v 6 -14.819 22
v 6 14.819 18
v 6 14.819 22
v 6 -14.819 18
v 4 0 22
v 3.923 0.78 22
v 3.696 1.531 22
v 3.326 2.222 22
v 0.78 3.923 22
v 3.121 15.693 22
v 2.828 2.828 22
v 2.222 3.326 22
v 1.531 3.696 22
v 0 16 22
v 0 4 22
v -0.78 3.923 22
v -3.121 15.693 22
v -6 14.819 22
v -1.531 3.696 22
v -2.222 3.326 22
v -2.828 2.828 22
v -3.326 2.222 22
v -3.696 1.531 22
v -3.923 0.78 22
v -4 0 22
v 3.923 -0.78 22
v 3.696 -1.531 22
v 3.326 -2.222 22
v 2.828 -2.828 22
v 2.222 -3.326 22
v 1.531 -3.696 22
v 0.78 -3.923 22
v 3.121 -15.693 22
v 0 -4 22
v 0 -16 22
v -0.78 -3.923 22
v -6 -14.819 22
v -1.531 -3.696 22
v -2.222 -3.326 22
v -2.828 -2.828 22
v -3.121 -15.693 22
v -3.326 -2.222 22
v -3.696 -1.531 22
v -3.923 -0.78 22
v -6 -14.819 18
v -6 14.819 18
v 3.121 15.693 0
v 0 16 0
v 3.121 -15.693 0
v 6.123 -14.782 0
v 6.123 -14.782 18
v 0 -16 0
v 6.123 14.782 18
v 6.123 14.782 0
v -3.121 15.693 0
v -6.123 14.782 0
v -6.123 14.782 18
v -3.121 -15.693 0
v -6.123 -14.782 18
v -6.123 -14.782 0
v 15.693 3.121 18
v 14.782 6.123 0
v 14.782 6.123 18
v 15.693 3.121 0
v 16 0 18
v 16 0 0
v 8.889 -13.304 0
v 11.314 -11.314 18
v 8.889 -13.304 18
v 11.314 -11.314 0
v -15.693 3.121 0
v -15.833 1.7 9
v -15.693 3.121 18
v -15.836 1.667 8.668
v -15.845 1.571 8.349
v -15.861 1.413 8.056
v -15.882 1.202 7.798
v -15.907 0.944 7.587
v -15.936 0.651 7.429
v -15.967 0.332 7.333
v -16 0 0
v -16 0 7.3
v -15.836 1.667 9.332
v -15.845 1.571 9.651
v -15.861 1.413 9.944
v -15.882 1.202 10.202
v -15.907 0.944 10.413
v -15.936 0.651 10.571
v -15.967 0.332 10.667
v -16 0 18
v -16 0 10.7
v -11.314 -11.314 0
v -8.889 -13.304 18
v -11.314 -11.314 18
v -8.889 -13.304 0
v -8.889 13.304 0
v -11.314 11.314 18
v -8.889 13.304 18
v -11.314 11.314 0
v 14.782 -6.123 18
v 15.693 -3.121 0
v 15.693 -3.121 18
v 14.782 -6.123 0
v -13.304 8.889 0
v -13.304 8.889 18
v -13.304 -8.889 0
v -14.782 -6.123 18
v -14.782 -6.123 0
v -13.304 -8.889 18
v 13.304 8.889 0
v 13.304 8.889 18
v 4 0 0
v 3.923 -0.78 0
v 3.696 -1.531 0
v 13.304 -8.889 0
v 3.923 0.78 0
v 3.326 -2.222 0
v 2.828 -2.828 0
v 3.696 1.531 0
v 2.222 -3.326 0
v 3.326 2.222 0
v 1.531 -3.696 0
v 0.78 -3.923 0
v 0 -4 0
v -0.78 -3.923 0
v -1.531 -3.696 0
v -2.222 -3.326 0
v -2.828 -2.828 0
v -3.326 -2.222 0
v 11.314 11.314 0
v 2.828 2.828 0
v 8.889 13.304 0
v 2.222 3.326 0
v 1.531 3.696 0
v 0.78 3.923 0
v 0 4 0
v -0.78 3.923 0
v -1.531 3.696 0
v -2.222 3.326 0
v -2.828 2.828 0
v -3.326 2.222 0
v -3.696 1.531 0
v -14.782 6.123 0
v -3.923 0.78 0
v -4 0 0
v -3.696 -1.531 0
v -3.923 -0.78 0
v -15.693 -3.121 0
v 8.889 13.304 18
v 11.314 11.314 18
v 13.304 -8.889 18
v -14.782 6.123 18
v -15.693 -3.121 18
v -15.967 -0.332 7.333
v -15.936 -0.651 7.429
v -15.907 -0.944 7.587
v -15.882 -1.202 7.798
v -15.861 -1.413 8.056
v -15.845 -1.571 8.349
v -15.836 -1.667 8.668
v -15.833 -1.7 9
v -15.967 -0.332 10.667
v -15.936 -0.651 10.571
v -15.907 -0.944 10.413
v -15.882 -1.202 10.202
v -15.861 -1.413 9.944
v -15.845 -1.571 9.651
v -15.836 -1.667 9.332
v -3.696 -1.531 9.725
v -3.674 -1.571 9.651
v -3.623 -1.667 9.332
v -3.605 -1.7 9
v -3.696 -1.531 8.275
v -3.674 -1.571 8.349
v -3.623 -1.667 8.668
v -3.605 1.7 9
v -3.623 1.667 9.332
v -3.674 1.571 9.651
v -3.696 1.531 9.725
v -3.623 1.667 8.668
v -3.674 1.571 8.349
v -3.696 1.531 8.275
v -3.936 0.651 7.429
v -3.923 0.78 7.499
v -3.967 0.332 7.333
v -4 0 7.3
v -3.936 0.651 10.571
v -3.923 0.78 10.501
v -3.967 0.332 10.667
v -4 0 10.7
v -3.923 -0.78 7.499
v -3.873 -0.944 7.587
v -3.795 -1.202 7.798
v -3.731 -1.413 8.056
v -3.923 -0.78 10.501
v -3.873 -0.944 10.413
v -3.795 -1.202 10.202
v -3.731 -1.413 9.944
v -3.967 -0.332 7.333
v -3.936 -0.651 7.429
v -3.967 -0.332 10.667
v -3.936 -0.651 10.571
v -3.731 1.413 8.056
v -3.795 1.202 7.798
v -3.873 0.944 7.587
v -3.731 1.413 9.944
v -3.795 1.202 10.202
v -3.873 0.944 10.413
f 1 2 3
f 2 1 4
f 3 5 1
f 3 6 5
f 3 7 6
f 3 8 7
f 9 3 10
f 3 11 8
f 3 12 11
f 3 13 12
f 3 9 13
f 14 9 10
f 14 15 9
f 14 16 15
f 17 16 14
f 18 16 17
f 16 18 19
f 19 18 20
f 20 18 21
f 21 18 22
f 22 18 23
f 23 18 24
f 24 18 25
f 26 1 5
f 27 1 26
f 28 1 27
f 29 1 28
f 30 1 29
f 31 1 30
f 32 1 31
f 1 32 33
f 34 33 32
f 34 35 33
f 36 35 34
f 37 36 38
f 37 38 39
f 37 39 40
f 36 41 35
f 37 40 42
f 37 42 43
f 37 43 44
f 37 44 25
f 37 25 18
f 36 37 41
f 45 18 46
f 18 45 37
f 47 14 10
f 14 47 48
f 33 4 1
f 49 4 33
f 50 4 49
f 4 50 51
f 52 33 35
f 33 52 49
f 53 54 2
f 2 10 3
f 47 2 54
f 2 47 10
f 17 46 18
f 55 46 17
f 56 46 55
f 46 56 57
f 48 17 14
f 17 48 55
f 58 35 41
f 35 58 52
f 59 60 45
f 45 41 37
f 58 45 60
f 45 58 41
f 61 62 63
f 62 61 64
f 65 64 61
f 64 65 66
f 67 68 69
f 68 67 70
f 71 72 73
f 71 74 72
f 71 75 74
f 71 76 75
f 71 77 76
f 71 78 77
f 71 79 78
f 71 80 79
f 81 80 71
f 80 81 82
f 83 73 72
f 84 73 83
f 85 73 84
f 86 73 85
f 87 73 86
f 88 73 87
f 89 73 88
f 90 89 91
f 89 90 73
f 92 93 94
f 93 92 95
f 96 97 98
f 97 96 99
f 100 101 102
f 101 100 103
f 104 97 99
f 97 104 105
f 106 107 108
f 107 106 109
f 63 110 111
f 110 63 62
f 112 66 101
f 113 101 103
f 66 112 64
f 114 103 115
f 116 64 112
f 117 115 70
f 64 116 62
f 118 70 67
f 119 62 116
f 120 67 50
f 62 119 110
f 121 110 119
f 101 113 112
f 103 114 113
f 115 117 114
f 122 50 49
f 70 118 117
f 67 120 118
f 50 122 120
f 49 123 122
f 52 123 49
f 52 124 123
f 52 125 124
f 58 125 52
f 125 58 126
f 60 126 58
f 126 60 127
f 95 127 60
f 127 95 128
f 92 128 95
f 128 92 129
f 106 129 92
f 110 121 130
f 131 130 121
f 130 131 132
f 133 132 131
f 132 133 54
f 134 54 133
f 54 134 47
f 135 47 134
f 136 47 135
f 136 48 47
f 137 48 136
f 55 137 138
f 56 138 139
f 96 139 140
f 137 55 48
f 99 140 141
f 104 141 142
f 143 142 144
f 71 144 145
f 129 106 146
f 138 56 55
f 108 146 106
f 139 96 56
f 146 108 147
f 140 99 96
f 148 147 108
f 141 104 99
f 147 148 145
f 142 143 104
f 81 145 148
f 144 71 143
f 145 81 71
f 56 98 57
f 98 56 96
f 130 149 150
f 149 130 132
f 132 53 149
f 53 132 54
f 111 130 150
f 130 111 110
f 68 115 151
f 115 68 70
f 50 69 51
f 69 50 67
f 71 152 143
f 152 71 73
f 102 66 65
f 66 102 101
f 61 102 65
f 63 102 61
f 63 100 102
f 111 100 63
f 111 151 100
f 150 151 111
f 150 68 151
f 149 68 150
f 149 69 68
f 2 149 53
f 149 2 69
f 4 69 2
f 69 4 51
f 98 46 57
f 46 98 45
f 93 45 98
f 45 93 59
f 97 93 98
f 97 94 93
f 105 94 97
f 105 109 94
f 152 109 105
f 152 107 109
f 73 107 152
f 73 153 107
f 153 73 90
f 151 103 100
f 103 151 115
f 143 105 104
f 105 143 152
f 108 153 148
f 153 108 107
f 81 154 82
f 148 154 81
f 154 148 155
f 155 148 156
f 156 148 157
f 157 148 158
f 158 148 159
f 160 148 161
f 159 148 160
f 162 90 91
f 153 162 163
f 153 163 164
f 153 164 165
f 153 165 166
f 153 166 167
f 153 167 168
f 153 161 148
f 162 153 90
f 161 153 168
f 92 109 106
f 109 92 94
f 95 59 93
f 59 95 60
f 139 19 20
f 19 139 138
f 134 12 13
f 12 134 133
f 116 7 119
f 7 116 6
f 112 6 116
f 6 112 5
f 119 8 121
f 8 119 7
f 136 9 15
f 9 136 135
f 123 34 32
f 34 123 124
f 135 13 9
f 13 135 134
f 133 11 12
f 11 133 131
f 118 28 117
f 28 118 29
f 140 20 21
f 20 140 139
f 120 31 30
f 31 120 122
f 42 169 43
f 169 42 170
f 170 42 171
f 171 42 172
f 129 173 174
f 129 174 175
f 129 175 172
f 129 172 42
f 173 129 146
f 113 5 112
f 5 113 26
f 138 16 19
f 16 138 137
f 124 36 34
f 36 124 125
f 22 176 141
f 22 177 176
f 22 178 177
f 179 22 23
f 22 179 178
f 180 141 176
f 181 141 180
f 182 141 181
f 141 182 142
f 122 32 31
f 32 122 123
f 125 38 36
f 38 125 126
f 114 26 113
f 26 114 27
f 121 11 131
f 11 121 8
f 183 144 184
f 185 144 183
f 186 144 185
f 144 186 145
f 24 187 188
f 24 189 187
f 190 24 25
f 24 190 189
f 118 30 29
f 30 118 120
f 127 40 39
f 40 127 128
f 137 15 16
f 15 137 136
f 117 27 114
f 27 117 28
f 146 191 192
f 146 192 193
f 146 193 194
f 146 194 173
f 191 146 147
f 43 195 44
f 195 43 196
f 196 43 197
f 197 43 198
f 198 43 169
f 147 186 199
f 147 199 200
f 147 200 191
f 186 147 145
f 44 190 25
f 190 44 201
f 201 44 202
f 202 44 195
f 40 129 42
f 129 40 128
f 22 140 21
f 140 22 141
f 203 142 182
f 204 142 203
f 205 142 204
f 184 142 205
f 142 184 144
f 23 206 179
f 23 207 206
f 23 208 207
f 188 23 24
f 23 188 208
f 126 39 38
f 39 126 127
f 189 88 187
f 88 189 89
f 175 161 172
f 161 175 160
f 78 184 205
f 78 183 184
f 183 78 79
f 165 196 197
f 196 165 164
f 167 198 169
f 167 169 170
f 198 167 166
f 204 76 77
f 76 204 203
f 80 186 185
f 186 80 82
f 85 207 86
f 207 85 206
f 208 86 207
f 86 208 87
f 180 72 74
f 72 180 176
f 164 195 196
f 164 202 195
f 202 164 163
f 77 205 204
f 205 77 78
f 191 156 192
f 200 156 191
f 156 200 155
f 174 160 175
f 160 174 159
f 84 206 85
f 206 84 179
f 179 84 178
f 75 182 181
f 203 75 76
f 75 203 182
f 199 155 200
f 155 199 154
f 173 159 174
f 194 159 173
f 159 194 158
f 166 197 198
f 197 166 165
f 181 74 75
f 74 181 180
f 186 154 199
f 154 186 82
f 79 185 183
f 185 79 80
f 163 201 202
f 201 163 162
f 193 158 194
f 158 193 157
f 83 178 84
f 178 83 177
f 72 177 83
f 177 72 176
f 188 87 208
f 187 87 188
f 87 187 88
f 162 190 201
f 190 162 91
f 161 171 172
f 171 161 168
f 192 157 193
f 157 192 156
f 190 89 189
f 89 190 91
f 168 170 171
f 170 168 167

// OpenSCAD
$fn = 32;

// ----------------------------------------------------------------------
// Oldham coupling hub: 32 x 22 mm
// ----------------------------------------------------------------------

// --- parameters (mm) ---
flange_dia = 32;          // hub diameter
flange_len = 18;          // hub length
hub_bore = 8;             // shaft bore
key_w = 12;               // drive tongue width
tongue_h = 4;             // drive tongue height
set_d = 3.4;              // set screw tap hole

module hub() {
  cylinder(h = flange_len, d = flange_dia);
  /* tongue, clipped to the hub disc and sunk 1 mm into the face */
  intersection() {
    translate([-key_w / 2, -flange_dia / 2, flange_len - 1])
      cube([key_w, flange_dia, tongue_h + 1]);
    translate([0, 0, flange_len - 1]) cylinder(h = tongue_h + 1, d = flange_dia);
  }
}

difference() {
  hub();
  translate([0, 0, -1]) cylinder(h = flange_len + tongue_h + 2, d = hub_bore);
  translate([-flange_dia / 2 - 1, 0, flange_len * 0.5])
    rotate([0, 90, 0]) cylinder(h = flange_dia / 2 + 2, d = set_d);
}
